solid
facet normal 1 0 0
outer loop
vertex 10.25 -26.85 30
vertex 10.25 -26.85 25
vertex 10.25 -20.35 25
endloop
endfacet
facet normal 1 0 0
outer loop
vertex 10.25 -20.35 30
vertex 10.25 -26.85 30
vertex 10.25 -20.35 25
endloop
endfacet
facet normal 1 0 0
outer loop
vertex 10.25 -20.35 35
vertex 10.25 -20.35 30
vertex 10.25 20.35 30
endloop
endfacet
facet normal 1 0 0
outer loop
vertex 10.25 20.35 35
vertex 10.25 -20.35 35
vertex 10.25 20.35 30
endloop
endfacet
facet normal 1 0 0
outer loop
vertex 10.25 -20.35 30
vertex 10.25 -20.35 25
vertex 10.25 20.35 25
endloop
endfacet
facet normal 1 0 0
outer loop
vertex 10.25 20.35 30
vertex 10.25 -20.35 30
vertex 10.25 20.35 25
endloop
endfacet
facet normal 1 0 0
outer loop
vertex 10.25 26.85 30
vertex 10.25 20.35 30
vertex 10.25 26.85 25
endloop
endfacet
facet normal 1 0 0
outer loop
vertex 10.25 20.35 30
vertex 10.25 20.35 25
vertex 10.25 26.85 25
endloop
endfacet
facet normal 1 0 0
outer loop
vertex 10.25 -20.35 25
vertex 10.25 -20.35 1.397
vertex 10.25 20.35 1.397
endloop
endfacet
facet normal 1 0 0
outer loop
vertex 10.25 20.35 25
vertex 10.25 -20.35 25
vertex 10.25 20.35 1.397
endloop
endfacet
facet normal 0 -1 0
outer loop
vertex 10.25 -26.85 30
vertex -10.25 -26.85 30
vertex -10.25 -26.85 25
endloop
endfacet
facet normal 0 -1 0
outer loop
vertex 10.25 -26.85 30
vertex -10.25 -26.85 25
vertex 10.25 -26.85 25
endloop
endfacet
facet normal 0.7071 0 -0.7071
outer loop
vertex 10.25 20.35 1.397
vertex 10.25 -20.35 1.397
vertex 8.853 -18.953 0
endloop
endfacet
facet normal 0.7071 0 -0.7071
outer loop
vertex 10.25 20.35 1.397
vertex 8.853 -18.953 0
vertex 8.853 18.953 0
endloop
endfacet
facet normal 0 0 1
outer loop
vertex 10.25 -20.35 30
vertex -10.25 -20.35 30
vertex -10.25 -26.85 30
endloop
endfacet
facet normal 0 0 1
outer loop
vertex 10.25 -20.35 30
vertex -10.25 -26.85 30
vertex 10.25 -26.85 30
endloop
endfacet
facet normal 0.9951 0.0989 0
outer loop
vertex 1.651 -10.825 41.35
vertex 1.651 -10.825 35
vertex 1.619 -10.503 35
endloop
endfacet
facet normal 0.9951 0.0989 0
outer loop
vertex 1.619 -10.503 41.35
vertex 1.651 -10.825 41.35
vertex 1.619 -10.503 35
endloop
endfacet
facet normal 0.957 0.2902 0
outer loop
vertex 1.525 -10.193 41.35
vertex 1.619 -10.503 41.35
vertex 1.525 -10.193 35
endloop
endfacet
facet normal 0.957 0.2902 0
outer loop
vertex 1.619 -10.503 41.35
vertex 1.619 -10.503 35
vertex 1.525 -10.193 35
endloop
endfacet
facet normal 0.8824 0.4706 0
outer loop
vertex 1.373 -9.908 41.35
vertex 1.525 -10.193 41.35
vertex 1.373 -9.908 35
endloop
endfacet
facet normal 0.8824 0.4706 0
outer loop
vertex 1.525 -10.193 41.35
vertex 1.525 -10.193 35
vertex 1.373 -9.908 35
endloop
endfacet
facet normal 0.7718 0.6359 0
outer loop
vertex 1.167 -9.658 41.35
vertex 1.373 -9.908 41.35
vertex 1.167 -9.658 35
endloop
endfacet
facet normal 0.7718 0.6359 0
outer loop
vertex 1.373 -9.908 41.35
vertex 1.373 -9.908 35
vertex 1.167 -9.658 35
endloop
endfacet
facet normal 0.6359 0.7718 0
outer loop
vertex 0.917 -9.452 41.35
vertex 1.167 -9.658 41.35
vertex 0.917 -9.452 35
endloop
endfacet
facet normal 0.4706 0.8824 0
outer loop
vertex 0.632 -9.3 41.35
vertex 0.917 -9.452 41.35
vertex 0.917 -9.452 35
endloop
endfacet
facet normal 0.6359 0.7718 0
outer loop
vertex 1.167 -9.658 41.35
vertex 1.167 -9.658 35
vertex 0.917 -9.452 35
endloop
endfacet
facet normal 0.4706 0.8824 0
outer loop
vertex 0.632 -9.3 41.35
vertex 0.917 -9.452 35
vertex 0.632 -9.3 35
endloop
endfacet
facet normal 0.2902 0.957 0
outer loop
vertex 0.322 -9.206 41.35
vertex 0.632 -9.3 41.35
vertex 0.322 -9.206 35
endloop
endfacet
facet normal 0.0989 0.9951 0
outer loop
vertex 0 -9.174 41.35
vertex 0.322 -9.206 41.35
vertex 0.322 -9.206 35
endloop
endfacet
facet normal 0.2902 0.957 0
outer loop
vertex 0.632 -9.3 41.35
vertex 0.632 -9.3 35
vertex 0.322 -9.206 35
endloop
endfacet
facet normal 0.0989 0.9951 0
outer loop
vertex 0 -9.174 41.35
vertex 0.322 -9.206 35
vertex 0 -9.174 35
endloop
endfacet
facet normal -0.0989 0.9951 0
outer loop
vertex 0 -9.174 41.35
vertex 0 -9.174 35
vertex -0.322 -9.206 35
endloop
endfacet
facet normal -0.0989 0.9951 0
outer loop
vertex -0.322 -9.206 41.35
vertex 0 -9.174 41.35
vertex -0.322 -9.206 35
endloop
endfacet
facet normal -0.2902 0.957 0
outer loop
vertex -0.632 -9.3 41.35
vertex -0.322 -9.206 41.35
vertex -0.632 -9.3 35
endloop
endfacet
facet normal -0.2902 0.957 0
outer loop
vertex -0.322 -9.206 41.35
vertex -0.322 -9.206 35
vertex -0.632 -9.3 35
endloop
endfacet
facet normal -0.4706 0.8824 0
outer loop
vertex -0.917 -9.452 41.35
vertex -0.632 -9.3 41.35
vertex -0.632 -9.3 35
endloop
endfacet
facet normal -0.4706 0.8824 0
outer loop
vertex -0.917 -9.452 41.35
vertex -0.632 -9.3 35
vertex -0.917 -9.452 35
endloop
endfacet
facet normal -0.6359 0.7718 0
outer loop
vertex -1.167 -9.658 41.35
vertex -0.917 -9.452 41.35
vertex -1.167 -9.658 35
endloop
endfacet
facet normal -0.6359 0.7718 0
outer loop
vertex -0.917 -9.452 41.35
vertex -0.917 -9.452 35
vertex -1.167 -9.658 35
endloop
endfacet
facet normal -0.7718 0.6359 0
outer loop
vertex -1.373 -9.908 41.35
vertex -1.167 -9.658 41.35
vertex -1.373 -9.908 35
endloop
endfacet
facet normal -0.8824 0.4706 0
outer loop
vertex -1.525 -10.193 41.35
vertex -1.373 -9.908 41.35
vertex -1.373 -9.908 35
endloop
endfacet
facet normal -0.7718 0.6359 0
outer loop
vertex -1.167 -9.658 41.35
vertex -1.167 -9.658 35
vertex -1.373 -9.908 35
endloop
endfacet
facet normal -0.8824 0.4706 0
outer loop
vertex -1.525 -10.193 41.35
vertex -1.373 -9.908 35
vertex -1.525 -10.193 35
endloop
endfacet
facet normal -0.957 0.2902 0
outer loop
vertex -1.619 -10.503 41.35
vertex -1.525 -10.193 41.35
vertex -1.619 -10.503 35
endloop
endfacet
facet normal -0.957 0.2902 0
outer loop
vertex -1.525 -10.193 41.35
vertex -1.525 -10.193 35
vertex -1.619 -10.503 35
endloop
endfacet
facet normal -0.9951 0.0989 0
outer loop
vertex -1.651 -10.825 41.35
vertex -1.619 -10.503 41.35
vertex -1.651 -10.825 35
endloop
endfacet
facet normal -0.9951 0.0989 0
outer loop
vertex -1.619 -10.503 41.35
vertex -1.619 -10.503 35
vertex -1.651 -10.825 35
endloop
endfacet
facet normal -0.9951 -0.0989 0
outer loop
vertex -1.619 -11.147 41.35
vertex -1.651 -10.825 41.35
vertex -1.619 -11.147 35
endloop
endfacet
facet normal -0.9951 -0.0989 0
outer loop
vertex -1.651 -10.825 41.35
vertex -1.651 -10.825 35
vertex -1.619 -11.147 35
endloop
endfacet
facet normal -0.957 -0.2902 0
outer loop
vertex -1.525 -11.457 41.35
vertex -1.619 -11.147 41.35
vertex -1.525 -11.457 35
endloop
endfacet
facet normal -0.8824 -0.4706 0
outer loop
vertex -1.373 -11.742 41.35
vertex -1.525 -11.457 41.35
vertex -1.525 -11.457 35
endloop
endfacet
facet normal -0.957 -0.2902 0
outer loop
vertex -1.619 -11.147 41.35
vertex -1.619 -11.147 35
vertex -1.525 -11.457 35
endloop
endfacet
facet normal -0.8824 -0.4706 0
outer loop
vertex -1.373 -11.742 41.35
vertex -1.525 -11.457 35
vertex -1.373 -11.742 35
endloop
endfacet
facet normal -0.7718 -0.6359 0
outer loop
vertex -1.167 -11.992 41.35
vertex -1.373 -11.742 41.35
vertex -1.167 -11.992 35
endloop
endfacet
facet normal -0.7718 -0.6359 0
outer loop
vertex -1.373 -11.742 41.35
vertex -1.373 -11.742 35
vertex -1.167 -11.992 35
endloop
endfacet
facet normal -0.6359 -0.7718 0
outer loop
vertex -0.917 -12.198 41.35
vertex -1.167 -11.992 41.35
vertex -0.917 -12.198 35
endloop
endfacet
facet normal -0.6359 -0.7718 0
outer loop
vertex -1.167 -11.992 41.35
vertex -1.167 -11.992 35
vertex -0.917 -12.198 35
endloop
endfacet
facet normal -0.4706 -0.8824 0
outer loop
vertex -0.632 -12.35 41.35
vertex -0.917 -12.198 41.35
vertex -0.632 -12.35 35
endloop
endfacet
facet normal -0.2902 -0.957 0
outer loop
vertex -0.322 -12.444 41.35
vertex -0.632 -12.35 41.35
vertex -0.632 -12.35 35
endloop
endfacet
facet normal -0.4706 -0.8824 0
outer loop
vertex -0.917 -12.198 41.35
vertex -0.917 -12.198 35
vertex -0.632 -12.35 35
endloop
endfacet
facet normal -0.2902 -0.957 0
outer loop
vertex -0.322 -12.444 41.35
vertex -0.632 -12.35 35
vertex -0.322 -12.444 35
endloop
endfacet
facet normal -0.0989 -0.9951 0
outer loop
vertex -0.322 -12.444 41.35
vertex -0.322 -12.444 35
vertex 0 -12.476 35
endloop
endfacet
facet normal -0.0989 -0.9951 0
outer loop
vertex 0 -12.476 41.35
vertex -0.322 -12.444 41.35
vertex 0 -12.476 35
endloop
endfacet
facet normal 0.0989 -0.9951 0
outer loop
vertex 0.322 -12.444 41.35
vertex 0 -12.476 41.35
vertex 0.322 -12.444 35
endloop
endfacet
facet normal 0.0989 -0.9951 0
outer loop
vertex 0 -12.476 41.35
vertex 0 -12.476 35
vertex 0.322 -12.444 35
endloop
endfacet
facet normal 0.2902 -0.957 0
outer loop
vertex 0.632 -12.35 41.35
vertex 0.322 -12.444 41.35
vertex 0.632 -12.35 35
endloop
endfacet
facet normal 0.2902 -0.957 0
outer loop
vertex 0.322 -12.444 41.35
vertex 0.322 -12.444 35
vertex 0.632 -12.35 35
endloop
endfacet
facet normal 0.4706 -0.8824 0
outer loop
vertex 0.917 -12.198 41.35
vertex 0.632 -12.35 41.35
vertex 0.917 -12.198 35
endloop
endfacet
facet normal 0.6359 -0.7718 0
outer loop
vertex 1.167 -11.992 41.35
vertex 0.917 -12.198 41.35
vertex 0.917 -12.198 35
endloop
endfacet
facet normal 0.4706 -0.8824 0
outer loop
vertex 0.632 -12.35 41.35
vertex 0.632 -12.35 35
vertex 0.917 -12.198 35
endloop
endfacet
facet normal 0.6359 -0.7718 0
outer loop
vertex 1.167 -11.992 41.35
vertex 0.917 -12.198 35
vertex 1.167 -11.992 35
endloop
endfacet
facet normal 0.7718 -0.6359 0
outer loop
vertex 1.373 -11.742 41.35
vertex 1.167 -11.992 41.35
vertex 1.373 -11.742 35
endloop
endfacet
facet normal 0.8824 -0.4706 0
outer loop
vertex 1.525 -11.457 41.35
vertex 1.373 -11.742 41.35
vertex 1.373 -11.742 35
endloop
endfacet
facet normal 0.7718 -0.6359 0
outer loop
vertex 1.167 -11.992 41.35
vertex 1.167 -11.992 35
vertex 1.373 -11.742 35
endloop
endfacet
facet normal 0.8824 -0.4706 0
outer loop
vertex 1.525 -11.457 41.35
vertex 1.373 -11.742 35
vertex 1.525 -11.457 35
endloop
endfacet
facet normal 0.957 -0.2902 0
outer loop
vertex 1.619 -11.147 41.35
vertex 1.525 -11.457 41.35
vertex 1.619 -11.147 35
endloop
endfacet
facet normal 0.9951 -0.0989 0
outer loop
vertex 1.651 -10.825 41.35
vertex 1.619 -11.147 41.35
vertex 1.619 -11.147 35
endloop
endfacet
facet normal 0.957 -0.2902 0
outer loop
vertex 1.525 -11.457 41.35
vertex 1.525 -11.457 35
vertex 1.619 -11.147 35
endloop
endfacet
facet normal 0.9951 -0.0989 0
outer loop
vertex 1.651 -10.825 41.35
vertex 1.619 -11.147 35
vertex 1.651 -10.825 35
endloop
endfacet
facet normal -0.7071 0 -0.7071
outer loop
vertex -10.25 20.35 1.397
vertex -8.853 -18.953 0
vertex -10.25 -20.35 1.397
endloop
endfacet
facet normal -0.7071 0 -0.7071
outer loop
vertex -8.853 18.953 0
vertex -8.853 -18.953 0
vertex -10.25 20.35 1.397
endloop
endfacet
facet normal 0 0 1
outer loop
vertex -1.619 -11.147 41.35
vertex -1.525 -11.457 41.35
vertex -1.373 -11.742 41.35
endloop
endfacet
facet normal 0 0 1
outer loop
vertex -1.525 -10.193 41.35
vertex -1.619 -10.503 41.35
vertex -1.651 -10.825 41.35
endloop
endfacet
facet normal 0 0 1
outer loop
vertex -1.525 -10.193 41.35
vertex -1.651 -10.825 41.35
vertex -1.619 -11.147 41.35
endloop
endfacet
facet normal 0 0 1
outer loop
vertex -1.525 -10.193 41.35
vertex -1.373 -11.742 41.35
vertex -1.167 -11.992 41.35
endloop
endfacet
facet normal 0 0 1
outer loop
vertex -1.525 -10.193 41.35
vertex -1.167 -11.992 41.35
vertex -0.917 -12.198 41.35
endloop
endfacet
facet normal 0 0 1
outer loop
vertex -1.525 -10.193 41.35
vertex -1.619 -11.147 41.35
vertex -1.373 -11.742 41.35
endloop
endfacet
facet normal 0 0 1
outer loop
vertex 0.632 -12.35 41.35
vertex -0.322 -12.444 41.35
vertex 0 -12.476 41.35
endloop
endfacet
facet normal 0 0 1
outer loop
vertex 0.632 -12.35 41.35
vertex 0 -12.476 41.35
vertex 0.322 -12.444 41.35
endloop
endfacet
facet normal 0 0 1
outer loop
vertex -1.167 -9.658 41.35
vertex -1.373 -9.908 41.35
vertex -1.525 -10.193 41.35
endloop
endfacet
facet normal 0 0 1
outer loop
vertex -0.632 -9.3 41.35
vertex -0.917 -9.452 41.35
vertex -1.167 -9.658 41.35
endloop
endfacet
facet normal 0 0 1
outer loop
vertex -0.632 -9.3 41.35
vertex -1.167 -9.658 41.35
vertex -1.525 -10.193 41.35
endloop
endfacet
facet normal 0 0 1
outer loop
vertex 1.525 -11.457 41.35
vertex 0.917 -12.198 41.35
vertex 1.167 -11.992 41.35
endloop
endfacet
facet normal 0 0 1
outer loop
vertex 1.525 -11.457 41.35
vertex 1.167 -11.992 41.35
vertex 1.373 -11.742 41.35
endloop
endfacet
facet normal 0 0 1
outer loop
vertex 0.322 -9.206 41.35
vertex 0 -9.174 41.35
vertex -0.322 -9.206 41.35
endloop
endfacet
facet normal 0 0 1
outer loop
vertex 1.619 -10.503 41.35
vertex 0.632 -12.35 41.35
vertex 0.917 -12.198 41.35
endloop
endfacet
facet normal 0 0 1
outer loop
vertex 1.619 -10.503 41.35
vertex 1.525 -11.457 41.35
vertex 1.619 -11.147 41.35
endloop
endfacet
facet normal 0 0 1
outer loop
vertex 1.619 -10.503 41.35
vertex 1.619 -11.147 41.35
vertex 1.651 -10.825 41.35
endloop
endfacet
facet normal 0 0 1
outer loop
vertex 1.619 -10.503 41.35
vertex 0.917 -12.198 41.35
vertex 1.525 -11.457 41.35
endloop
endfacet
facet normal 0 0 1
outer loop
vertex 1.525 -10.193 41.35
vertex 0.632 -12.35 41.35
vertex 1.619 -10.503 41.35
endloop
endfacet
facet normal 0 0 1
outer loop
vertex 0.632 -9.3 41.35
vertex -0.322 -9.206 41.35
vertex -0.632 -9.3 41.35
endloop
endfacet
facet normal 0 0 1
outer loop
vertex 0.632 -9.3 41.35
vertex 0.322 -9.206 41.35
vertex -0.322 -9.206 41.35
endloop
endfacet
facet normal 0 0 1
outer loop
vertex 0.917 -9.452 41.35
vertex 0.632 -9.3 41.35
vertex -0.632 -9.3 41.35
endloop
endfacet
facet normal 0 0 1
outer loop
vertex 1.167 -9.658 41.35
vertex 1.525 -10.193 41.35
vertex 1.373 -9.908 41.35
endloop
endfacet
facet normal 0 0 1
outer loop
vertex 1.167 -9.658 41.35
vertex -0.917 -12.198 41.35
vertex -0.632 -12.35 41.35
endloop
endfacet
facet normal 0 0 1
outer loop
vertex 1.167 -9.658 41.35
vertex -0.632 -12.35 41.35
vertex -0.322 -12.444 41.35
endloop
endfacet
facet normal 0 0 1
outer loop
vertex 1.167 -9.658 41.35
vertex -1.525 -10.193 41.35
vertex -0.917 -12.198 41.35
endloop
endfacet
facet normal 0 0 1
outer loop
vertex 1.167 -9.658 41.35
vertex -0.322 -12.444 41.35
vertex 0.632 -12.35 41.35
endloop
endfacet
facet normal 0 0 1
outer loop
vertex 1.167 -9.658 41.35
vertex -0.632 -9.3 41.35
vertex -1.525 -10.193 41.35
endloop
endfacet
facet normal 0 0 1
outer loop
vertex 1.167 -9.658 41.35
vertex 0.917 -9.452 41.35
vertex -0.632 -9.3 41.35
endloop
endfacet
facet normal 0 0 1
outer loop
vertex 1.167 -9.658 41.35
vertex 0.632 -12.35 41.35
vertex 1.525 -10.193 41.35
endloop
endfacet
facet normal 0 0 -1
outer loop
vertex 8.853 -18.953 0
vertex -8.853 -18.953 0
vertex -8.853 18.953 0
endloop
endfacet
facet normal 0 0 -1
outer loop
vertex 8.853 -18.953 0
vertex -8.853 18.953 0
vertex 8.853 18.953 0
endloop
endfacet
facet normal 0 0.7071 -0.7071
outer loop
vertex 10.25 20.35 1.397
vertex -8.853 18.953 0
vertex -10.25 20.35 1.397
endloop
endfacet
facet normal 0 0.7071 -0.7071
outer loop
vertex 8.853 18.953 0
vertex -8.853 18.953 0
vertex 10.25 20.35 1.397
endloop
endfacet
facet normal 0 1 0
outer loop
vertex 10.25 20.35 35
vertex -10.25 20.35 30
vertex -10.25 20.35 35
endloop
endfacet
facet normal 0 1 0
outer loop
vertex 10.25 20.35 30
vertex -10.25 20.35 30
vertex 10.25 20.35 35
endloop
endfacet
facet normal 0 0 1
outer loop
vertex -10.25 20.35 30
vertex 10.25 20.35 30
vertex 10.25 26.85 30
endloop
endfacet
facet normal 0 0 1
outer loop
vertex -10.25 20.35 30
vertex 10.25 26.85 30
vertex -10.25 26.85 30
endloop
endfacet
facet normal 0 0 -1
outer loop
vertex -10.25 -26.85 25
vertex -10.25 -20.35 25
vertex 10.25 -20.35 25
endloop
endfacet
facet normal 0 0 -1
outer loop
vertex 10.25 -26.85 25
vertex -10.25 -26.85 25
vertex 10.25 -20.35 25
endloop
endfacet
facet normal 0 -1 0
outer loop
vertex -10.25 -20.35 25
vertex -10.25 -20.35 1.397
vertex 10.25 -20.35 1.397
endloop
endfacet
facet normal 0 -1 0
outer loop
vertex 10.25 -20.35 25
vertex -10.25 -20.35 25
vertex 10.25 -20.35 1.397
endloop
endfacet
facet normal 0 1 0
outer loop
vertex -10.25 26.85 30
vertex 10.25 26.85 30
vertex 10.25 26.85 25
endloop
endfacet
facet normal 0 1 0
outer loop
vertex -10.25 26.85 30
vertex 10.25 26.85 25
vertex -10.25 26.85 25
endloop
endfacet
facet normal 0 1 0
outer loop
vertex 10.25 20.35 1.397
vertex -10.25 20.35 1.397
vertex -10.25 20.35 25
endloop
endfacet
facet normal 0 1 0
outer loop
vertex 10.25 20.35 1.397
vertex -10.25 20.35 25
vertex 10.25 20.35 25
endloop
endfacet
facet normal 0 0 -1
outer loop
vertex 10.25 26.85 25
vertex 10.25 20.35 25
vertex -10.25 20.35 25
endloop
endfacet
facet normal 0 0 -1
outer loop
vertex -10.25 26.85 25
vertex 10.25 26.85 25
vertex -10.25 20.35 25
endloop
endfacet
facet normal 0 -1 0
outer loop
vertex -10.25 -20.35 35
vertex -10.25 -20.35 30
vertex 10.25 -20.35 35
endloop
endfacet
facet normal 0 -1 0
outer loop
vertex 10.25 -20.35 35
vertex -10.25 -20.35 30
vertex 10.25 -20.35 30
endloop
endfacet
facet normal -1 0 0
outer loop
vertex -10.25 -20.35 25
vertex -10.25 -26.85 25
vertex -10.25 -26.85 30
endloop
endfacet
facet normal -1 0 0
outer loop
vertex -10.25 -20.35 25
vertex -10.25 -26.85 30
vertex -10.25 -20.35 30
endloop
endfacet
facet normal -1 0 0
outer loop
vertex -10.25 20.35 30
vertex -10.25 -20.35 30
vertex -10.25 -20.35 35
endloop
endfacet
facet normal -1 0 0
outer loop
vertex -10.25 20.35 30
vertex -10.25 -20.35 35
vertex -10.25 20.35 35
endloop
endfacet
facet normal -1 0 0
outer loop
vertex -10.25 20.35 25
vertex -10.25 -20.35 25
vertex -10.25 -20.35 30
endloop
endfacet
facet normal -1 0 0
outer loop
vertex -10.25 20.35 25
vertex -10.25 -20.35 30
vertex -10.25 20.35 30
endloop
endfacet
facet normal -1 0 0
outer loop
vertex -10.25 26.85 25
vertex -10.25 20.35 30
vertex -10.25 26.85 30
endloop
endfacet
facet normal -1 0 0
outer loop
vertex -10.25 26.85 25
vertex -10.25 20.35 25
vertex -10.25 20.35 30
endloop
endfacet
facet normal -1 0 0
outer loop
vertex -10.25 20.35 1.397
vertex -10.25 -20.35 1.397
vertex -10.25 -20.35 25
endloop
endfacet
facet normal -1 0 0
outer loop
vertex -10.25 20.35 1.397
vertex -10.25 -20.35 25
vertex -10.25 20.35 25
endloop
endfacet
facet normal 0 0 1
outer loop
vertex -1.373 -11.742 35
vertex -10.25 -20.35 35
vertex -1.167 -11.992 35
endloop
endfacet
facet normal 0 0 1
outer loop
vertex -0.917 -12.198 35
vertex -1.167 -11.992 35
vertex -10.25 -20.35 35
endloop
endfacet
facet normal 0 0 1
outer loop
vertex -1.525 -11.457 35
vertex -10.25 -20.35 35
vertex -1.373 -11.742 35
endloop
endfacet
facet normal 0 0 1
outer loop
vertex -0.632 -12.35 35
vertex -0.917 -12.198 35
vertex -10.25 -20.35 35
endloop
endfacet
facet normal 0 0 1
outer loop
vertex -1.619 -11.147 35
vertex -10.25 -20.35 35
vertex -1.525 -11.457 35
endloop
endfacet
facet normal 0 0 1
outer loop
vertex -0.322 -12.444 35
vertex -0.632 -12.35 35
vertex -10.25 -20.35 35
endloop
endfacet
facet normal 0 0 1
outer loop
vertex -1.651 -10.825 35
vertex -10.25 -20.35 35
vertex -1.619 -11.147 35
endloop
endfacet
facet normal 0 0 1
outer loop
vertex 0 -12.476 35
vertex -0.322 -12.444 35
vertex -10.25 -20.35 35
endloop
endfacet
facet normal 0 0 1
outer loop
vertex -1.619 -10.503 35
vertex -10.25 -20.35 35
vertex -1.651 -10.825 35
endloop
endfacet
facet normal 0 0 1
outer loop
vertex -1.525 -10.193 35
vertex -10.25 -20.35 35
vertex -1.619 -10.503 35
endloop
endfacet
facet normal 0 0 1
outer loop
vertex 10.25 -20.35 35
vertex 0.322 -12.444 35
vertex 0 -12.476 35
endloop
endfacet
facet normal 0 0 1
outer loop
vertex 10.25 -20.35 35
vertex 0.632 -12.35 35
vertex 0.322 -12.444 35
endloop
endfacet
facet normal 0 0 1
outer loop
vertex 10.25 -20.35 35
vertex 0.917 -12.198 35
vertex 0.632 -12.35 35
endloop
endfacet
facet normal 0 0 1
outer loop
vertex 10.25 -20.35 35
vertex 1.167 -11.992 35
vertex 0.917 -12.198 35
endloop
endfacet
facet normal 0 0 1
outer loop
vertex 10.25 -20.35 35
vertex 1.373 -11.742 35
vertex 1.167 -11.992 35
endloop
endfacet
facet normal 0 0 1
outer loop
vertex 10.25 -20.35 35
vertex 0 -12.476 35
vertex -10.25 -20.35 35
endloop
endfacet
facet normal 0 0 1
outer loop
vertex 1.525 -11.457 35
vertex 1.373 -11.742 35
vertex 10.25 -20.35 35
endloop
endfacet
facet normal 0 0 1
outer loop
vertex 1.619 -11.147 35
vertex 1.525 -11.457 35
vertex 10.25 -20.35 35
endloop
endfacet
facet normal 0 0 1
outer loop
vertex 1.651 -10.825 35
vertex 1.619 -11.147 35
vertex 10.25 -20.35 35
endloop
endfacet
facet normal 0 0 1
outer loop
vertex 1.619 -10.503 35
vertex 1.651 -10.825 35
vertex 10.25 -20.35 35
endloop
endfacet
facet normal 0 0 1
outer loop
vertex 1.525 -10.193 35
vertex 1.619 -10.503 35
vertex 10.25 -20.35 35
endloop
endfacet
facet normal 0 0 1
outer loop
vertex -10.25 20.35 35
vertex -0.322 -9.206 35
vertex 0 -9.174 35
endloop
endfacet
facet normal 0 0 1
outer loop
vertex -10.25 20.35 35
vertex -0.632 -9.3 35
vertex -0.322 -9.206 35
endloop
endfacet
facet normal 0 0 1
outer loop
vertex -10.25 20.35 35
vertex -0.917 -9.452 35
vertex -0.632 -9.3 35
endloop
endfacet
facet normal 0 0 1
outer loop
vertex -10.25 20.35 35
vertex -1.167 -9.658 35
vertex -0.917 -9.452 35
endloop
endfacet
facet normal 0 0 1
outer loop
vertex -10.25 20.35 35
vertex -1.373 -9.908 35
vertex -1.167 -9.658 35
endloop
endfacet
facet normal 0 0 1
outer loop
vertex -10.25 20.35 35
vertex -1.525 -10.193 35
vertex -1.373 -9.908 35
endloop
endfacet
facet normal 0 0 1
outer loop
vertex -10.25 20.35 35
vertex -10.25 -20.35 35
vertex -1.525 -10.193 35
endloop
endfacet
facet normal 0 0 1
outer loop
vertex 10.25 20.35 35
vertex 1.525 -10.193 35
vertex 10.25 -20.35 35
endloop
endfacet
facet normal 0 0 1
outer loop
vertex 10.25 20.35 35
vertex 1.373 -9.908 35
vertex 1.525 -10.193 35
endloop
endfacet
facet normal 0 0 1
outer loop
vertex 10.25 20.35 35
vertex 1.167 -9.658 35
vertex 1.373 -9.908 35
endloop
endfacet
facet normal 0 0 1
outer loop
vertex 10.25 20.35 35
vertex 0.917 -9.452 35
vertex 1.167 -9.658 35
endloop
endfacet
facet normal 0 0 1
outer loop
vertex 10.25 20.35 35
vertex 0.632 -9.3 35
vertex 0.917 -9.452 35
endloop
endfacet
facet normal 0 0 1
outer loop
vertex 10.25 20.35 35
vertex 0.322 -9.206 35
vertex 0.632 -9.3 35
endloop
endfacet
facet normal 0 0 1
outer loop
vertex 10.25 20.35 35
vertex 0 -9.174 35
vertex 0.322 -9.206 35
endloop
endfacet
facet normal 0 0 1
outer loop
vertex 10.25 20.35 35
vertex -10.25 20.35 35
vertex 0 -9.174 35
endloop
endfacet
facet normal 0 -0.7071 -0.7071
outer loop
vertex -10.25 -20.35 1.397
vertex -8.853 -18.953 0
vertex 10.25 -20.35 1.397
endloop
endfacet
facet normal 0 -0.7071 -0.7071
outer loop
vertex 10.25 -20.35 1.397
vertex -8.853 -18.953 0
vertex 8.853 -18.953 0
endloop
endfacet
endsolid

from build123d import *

# Parameters (mm, degrees)
F0_W     = 20.5
F0_H     = 40.7
F1_DEPTH = 35
F2_R     = 1.651
F3_DEPTH = 6.35
F4_W     = 20.5
F4_H     = 5
F5_DEPTH = 6.5
F6_W     = 20.5
F6_H     = 5
F7_DEPTH = 6.5
F8_SIZE  = 1.397


with BuildPart() as f1:
    # F0 (on Top) → F1 (new body)
    with BuildSketch(Plane.XY):
        Rectangle(F0_W, F0_H)
    extrude(amount=F1_DEPTH)

    # F2 (on face) → F3 (join)
    with BuildSketch(Plane.XY.offset(35)):
        with Locations((0, -10.825)):
            Circle(F2_R)
    extrude(amount=F3_DEPTH)

    # F4 (on face) → F5 (join)
    with BuildSketch(Plane.XZ.offset(20.35)):
        with Locations((0, 27.5)):
            Rectangle(F4_W, F4_H)
    extrude(amount=F5_DEPTH)

    # F6 (on face) → F7 (join)
    with BuildSketch(Plane(origin=(0, 20.35, 0), x_dir=(-1, 0, 0), z_dir=(0, 1, 0))):
        with Locations((0, 27.5)):
            Rectangle(F6_W, F6_H)
    extrude(amount=F7_DEPTH)

    # F8
    f8_edges = [f1.edges().sort_by_distance(p)[0] for p in [
        (0, -20.35, 0),
        (10.25, 0, 0),
        (-10.25, 0, 0),
        (0, 20.35, 0),
    ]]
    chamfer(f8_edges, length=F8_SIZE)


solid = f1.part
